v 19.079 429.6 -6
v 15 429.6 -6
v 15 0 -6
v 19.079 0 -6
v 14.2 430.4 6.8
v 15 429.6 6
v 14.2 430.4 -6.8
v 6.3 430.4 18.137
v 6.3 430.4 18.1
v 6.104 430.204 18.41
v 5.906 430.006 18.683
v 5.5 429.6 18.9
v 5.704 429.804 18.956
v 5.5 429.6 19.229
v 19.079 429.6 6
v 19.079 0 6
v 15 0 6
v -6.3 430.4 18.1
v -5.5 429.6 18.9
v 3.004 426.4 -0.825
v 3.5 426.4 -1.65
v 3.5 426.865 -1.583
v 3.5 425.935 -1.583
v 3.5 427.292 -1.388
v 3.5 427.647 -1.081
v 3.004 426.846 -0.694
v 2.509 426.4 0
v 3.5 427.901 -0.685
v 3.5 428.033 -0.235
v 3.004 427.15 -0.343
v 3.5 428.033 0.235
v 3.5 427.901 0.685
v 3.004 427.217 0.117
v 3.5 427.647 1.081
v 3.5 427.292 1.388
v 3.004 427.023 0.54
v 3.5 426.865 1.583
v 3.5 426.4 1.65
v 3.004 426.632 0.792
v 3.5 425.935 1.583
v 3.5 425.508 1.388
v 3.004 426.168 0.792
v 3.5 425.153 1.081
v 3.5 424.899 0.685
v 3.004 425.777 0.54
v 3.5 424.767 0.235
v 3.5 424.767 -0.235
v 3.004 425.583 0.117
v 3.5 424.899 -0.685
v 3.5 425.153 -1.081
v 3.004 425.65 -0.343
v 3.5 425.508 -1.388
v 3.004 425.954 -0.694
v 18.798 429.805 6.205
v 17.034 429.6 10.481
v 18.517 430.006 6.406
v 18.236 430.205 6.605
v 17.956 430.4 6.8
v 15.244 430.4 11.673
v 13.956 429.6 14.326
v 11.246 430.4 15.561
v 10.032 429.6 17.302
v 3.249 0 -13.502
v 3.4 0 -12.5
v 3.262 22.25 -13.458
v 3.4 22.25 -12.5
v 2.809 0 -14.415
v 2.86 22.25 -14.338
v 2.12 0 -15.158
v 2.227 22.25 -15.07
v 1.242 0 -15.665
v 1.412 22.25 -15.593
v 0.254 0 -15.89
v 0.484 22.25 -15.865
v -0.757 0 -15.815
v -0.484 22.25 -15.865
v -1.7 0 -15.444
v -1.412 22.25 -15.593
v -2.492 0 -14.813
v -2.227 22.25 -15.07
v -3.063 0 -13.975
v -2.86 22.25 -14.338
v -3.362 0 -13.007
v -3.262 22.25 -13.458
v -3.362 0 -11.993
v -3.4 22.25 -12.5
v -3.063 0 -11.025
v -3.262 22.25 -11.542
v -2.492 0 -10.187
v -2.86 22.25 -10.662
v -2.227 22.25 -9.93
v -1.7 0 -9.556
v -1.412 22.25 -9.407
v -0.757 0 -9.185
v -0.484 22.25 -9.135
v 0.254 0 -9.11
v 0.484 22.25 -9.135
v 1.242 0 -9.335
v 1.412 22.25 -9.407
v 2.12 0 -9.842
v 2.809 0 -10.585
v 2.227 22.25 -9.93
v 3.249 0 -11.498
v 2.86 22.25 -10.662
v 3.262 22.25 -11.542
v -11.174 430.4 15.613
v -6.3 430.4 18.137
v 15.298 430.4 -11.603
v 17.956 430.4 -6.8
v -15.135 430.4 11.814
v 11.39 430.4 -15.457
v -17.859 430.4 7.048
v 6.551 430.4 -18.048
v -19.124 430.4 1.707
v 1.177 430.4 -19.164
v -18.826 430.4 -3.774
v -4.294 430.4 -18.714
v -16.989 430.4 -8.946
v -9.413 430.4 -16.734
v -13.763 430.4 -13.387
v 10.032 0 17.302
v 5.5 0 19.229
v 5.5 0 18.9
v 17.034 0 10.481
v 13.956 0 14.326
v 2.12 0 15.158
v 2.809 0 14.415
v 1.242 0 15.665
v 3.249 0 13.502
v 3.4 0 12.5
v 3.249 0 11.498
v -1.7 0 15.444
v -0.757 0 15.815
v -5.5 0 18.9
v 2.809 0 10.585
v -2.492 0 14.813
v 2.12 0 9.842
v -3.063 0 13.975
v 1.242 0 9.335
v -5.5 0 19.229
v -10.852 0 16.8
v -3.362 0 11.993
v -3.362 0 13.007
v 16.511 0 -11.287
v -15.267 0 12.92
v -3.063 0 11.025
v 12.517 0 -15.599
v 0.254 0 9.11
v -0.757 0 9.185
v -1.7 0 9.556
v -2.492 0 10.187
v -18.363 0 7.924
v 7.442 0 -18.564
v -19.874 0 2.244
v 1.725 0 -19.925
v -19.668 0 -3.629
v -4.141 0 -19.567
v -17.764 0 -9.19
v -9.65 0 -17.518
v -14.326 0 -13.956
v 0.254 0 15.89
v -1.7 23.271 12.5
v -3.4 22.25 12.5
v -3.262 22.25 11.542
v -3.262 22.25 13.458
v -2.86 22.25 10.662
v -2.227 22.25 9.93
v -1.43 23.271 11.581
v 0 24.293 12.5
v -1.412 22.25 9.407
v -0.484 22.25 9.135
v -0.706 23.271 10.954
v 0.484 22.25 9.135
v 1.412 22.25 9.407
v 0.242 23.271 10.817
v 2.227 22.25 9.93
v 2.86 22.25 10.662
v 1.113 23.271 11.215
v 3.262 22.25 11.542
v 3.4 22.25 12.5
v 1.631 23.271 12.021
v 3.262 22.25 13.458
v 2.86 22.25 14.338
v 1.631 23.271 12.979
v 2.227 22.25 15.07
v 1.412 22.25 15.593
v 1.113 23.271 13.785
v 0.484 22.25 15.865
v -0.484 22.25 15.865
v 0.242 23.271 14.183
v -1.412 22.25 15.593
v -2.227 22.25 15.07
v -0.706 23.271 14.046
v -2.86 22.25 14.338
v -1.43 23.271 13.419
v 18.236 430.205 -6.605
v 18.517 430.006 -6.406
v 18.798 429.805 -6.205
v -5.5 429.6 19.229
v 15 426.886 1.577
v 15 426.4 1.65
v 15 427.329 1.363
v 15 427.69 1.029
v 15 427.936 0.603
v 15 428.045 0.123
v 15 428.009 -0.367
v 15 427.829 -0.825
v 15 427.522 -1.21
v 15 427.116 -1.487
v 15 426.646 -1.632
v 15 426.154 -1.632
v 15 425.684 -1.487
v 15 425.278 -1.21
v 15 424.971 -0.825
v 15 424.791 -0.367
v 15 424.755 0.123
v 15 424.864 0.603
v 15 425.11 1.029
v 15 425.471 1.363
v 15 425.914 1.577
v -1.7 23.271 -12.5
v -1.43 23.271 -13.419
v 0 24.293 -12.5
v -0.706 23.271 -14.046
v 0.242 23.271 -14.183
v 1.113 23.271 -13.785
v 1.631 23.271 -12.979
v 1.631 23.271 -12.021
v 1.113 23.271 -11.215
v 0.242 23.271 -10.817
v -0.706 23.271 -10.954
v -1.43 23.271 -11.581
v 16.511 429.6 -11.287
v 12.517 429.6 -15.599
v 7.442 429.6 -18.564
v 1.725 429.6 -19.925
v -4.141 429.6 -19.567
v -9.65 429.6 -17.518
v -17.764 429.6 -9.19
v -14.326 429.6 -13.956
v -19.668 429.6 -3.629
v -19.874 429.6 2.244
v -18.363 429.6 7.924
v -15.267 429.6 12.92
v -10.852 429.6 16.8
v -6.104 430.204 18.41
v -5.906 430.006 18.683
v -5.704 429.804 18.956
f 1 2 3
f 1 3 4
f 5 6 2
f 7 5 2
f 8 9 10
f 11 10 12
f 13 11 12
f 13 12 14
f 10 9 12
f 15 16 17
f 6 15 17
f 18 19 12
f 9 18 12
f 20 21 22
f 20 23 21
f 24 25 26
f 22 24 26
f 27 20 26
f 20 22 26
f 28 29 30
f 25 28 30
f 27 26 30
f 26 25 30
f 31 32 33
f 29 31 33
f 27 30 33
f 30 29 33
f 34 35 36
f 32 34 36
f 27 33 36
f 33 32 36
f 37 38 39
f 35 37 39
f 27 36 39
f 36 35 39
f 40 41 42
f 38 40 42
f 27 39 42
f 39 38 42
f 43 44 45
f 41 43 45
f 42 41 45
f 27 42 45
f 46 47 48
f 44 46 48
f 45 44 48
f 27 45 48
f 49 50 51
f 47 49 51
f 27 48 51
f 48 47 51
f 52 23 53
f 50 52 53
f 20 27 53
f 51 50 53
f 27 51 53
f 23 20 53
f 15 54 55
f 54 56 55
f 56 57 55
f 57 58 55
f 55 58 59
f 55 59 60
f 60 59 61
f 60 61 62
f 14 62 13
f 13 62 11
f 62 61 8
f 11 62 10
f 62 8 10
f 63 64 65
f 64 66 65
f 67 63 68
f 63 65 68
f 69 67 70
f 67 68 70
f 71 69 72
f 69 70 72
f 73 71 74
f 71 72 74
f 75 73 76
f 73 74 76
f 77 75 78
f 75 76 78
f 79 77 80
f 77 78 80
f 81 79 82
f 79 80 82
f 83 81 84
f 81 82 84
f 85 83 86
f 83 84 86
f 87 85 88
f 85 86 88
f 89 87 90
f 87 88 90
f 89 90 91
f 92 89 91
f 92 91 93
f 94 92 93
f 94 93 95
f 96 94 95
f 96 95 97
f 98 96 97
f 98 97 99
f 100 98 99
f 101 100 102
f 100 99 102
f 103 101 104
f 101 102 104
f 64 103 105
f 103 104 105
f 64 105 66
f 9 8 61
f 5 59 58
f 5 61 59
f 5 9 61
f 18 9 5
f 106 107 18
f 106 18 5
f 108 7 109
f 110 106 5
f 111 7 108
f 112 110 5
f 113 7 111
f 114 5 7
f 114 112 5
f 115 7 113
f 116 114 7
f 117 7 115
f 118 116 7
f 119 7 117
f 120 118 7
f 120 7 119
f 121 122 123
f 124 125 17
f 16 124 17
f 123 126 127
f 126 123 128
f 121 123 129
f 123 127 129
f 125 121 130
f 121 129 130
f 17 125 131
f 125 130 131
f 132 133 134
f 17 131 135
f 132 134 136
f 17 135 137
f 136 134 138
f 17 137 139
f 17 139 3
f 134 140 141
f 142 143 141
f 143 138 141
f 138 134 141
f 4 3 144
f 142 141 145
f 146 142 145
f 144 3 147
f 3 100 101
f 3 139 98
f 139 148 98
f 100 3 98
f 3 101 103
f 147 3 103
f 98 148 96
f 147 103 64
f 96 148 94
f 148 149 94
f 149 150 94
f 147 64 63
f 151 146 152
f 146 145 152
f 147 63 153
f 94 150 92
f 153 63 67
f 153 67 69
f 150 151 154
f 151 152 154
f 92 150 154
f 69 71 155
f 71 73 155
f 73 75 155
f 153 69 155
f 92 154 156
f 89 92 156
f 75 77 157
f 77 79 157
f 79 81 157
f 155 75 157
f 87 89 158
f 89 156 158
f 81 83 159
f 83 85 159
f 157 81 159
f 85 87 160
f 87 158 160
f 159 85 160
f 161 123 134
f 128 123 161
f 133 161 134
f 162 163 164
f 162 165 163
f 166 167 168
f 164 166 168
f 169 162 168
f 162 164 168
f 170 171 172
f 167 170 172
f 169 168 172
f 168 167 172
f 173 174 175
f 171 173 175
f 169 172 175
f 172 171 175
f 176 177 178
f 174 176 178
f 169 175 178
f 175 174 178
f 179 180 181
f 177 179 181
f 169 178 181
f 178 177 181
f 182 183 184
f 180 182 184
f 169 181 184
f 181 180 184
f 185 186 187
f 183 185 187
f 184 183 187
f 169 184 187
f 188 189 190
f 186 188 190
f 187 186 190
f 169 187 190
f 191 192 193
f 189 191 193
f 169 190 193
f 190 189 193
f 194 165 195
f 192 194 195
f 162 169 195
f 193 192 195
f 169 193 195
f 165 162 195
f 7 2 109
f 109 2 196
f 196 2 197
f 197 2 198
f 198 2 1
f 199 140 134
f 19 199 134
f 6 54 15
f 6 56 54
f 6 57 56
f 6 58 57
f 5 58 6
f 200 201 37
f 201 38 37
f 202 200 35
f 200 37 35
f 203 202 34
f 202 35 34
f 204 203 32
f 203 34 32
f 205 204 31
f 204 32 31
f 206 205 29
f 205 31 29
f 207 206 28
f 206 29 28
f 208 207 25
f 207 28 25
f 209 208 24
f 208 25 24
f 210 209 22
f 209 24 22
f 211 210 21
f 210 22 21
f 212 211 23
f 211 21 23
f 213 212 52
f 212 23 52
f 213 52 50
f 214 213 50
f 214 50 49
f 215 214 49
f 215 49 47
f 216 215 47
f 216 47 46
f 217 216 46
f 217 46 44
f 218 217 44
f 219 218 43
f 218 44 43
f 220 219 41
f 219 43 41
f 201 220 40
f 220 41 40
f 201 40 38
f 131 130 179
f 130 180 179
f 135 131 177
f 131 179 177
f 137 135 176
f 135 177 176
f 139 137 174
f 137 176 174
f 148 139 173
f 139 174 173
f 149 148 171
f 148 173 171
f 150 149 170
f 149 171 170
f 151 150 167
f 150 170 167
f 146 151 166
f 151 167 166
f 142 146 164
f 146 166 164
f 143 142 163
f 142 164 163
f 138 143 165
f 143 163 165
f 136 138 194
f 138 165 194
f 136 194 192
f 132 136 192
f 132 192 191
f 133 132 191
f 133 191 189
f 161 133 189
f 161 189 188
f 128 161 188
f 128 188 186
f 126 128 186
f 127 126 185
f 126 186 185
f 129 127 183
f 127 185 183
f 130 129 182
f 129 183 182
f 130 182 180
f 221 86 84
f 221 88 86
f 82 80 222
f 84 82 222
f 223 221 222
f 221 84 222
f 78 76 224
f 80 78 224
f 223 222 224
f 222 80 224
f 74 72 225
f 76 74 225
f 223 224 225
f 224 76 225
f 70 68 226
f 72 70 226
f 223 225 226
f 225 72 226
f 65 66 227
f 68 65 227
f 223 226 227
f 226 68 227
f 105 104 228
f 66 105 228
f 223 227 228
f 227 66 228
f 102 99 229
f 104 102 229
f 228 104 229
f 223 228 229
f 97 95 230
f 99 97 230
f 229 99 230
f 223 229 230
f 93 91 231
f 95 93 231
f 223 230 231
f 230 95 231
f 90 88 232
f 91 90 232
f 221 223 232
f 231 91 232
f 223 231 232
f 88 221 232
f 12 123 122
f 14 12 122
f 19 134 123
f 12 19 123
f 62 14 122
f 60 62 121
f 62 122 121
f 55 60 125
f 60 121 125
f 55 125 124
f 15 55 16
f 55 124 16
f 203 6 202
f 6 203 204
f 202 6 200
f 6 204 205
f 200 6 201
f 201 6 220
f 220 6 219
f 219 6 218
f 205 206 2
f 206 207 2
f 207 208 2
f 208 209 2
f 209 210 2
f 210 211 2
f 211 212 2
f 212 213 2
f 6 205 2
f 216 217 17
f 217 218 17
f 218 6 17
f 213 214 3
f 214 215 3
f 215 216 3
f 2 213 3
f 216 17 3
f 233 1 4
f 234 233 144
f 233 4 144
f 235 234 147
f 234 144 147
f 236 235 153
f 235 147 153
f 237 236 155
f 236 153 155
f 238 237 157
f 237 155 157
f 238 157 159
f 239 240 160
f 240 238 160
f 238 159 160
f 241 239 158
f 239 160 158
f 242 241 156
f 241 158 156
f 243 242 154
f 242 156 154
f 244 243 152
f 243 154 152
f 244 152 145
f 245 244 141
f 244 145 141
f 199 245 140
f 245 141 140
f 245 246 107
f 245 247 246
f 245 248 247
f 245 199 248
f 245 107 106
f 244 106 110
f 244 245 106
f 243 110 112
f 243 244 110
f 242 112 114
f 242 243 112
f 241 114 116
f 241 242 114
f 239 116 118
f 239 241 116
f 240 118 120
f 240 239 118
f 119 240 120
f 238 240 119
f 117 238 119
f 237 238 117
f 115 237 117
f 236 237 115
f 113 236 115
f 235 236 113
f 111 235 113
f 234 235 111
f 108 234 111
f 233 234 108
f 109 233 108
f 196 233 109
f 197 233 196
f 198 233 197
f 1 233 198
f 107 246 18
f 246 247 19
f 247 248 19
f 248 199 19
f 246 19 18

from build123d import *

# Parameters (mm, degrees)
ESQUISSE1_R                         = 20
BOSS_EXTRU_1_DEPTH                  = 430.4
TROU_TARAUD_M81_D                   = 6.8
TROU_TARAUD_M81_DEPTH               = 22.25
TROU_TARAUD_M81_TIP                 = 2.042926105
ENL_V_MAT_EXTRU_1_REACH             = 433.328
ENL_V_MAT_EXTRU_1_DIRECTION_2_DEPTH = 432.328366793
TROU_TARAUD_M41_D                   = 3.3
TROU_TARAUD_M41_DEPTH               = 11.5
TROU_TARAUD_M41_TIP                 = 0.991420021
CHANFREIN1_SIZE                     = 0.8


with BuildPart() as part:
    # Esquisse1 → Boss.-Extru.1 (new body)
    with BuildSketch(Plane(origin=(0, 0, 0), x_dir=(1, 0, 0), z_dir=(0, 1, 0))):
        with Locations(Location((0, 0, 0), (0, 0, 90))):
            Circle(ESQUISSE1_R)
    extrude(amount=BOSS_EXTRU_1_DEPTH)

    # Trou taraudé M81
    with Locations(Plane(origin=(0, 0, 0), x_dir=(-1, 0, 0), z_dir=(0, -1, 0))):
        with Locations((0, -12.5), (0, 12.5)):
            Hole(TROU_TARAUD_M81_D / 2, depth=TROU_TARAUD_M81_DEPTH)
            with Locations((0, 0, -(TROU_TARAUD_M81_DEPTH + TROU_TARAUD_M81_TIP / 2))):  # 118° drill point
                Cone(0, TROU_TARAUD_M81_D / 2, TROU_TARAUD_M81_TIP, mode=Mode.SUBTRACT)

    # Esquisse8 → Enlèv. mat.-Extru.1 (cut, up to next)
    with BuildSketch(Plane.XZ, mode=Mode.PRIVATE) as enl_v_mat_extru_1_sk1:
        with BuildLine():
            Line((-5.5, 19.228884523), (-5.5, 18.9))
            Line((-5.5, 18.9), (5.5, 18.9))
            Line((5.5, 18.9), (5.5, 19.228884523))
            ThreePointArc((5.5, 19.228884523), (0, 20), (-5.5, 19.228884523))
        make_face()
    enl_v_mat_extru_1_tool1 = extrude(enl_v_mat_extru_1_sk1.sketch, amount=-ENL_V_MAT_EXTRU_1_REACH, mode=Mode.PRIVATE) & part.part
    # Esquisse8 → Enlèv. mat.-Extru.1 (cut, up to next)
    with BuildSketch(Plane.XZ, mode=Mode.PRIVATE) as enl_v_mat_extru_1_sk2:
        with BuildLine():
            Line((19.078784028, 6), (15, 6))
            Line((15, 6), (15, -6))
            Line((15, -6), (19.078784028, -6))
            ThreePointArc((19.078784028, -6), (20, 0), (19.078784028, 6))
        make_face()
    enl_v_mat_extru_1_tool2 = extrude(enl_v_mat_extru_1_sk2.sketch, amount=-ENL_V_MAT_EXTRU_1_REACH, mode=Mode.PRIVATE) & part.part
    add(enl_v_mat_extru_1_tool1.solids().sort_by_distance((0, 0, 19.353586))[0], mode=Mode.SUBTRACT)
    add(enl_v_mat_extru_1_tool2.solids().sort_by_distance((17.355884, 0, 0))[0], mode=Mode.SUBTRACT)

    # Esquisse8 → Enlèv. mat.-Extru.1 direction 2 (cut)
    with BuildSketch(Plane.XZ):
        with BuildLine():
            Line((-5.5, 19.228884523), (-5.5, 18.9))
            Line((-5.5, 18.9), (5.5, 18.9))
            Line((5.5, 18.9), (5.5, 19.228884523))
            ThreePointArc((5.5, 19.228884523), (0, 20), (-5.5, 19.228884523))
        make_face()
        with BuildLine():
            Line((19.078784028, 6), (15, 6))
            Line((15, 6), (15, -6))
            Line((15, -6), (19.078784028, -6))
            ThreePointArc((19.078784028, -6), (20, 0), (19.078784028, 6))
        make_face()
    extrude(amount=ENL_V_MAT_EXTRU_1_DIRECTION_2_DEPTH, mode=Mode.SUBTRACT)

    # Trou taraudé M41
    with Locations(Plane(origin=(15, 0, 0), x_dir=(0, 0, -1), z_dir=(1, 0, 0))):
        with Locations((0, 426.4)):
            Hole(TROU_TARAUD_M41_D / 2, depth=TROU_TARAUD_M41_DEPTH)
            with Locations((0, 0, -(TROU_TARAUD_M41_DEPTH + TROU_TARAUD_M41_TIP / 2))):  # 118° drill point
                Cone(0, TROU_TARAUD_M41_D / 2, TROU_TARAUD_M41_TIP, mode=Mode.SUBTRACT)

    # Chanfrein1
    chanfrein1_edges = [part.edges().sort_by_distance(p)[0] for p in [
        (5.5, 430.4, 19.064442262),
        (0, 430.4, 18.9),
        (-5.5, 430.4, 19.064442262),
        (-14.325501649, 430.4, -13.956360647),
        (17.039392014, 430.4, -6),
        (15, 430.4, 0),
        (17.039392014, 430.4, 6),
        (13.956360647, 430.4, 14.325501649),
    ]]
    chamfer(chanfrein1_edges, length=CHANFREIN1_SIZE)


solid = part.part
